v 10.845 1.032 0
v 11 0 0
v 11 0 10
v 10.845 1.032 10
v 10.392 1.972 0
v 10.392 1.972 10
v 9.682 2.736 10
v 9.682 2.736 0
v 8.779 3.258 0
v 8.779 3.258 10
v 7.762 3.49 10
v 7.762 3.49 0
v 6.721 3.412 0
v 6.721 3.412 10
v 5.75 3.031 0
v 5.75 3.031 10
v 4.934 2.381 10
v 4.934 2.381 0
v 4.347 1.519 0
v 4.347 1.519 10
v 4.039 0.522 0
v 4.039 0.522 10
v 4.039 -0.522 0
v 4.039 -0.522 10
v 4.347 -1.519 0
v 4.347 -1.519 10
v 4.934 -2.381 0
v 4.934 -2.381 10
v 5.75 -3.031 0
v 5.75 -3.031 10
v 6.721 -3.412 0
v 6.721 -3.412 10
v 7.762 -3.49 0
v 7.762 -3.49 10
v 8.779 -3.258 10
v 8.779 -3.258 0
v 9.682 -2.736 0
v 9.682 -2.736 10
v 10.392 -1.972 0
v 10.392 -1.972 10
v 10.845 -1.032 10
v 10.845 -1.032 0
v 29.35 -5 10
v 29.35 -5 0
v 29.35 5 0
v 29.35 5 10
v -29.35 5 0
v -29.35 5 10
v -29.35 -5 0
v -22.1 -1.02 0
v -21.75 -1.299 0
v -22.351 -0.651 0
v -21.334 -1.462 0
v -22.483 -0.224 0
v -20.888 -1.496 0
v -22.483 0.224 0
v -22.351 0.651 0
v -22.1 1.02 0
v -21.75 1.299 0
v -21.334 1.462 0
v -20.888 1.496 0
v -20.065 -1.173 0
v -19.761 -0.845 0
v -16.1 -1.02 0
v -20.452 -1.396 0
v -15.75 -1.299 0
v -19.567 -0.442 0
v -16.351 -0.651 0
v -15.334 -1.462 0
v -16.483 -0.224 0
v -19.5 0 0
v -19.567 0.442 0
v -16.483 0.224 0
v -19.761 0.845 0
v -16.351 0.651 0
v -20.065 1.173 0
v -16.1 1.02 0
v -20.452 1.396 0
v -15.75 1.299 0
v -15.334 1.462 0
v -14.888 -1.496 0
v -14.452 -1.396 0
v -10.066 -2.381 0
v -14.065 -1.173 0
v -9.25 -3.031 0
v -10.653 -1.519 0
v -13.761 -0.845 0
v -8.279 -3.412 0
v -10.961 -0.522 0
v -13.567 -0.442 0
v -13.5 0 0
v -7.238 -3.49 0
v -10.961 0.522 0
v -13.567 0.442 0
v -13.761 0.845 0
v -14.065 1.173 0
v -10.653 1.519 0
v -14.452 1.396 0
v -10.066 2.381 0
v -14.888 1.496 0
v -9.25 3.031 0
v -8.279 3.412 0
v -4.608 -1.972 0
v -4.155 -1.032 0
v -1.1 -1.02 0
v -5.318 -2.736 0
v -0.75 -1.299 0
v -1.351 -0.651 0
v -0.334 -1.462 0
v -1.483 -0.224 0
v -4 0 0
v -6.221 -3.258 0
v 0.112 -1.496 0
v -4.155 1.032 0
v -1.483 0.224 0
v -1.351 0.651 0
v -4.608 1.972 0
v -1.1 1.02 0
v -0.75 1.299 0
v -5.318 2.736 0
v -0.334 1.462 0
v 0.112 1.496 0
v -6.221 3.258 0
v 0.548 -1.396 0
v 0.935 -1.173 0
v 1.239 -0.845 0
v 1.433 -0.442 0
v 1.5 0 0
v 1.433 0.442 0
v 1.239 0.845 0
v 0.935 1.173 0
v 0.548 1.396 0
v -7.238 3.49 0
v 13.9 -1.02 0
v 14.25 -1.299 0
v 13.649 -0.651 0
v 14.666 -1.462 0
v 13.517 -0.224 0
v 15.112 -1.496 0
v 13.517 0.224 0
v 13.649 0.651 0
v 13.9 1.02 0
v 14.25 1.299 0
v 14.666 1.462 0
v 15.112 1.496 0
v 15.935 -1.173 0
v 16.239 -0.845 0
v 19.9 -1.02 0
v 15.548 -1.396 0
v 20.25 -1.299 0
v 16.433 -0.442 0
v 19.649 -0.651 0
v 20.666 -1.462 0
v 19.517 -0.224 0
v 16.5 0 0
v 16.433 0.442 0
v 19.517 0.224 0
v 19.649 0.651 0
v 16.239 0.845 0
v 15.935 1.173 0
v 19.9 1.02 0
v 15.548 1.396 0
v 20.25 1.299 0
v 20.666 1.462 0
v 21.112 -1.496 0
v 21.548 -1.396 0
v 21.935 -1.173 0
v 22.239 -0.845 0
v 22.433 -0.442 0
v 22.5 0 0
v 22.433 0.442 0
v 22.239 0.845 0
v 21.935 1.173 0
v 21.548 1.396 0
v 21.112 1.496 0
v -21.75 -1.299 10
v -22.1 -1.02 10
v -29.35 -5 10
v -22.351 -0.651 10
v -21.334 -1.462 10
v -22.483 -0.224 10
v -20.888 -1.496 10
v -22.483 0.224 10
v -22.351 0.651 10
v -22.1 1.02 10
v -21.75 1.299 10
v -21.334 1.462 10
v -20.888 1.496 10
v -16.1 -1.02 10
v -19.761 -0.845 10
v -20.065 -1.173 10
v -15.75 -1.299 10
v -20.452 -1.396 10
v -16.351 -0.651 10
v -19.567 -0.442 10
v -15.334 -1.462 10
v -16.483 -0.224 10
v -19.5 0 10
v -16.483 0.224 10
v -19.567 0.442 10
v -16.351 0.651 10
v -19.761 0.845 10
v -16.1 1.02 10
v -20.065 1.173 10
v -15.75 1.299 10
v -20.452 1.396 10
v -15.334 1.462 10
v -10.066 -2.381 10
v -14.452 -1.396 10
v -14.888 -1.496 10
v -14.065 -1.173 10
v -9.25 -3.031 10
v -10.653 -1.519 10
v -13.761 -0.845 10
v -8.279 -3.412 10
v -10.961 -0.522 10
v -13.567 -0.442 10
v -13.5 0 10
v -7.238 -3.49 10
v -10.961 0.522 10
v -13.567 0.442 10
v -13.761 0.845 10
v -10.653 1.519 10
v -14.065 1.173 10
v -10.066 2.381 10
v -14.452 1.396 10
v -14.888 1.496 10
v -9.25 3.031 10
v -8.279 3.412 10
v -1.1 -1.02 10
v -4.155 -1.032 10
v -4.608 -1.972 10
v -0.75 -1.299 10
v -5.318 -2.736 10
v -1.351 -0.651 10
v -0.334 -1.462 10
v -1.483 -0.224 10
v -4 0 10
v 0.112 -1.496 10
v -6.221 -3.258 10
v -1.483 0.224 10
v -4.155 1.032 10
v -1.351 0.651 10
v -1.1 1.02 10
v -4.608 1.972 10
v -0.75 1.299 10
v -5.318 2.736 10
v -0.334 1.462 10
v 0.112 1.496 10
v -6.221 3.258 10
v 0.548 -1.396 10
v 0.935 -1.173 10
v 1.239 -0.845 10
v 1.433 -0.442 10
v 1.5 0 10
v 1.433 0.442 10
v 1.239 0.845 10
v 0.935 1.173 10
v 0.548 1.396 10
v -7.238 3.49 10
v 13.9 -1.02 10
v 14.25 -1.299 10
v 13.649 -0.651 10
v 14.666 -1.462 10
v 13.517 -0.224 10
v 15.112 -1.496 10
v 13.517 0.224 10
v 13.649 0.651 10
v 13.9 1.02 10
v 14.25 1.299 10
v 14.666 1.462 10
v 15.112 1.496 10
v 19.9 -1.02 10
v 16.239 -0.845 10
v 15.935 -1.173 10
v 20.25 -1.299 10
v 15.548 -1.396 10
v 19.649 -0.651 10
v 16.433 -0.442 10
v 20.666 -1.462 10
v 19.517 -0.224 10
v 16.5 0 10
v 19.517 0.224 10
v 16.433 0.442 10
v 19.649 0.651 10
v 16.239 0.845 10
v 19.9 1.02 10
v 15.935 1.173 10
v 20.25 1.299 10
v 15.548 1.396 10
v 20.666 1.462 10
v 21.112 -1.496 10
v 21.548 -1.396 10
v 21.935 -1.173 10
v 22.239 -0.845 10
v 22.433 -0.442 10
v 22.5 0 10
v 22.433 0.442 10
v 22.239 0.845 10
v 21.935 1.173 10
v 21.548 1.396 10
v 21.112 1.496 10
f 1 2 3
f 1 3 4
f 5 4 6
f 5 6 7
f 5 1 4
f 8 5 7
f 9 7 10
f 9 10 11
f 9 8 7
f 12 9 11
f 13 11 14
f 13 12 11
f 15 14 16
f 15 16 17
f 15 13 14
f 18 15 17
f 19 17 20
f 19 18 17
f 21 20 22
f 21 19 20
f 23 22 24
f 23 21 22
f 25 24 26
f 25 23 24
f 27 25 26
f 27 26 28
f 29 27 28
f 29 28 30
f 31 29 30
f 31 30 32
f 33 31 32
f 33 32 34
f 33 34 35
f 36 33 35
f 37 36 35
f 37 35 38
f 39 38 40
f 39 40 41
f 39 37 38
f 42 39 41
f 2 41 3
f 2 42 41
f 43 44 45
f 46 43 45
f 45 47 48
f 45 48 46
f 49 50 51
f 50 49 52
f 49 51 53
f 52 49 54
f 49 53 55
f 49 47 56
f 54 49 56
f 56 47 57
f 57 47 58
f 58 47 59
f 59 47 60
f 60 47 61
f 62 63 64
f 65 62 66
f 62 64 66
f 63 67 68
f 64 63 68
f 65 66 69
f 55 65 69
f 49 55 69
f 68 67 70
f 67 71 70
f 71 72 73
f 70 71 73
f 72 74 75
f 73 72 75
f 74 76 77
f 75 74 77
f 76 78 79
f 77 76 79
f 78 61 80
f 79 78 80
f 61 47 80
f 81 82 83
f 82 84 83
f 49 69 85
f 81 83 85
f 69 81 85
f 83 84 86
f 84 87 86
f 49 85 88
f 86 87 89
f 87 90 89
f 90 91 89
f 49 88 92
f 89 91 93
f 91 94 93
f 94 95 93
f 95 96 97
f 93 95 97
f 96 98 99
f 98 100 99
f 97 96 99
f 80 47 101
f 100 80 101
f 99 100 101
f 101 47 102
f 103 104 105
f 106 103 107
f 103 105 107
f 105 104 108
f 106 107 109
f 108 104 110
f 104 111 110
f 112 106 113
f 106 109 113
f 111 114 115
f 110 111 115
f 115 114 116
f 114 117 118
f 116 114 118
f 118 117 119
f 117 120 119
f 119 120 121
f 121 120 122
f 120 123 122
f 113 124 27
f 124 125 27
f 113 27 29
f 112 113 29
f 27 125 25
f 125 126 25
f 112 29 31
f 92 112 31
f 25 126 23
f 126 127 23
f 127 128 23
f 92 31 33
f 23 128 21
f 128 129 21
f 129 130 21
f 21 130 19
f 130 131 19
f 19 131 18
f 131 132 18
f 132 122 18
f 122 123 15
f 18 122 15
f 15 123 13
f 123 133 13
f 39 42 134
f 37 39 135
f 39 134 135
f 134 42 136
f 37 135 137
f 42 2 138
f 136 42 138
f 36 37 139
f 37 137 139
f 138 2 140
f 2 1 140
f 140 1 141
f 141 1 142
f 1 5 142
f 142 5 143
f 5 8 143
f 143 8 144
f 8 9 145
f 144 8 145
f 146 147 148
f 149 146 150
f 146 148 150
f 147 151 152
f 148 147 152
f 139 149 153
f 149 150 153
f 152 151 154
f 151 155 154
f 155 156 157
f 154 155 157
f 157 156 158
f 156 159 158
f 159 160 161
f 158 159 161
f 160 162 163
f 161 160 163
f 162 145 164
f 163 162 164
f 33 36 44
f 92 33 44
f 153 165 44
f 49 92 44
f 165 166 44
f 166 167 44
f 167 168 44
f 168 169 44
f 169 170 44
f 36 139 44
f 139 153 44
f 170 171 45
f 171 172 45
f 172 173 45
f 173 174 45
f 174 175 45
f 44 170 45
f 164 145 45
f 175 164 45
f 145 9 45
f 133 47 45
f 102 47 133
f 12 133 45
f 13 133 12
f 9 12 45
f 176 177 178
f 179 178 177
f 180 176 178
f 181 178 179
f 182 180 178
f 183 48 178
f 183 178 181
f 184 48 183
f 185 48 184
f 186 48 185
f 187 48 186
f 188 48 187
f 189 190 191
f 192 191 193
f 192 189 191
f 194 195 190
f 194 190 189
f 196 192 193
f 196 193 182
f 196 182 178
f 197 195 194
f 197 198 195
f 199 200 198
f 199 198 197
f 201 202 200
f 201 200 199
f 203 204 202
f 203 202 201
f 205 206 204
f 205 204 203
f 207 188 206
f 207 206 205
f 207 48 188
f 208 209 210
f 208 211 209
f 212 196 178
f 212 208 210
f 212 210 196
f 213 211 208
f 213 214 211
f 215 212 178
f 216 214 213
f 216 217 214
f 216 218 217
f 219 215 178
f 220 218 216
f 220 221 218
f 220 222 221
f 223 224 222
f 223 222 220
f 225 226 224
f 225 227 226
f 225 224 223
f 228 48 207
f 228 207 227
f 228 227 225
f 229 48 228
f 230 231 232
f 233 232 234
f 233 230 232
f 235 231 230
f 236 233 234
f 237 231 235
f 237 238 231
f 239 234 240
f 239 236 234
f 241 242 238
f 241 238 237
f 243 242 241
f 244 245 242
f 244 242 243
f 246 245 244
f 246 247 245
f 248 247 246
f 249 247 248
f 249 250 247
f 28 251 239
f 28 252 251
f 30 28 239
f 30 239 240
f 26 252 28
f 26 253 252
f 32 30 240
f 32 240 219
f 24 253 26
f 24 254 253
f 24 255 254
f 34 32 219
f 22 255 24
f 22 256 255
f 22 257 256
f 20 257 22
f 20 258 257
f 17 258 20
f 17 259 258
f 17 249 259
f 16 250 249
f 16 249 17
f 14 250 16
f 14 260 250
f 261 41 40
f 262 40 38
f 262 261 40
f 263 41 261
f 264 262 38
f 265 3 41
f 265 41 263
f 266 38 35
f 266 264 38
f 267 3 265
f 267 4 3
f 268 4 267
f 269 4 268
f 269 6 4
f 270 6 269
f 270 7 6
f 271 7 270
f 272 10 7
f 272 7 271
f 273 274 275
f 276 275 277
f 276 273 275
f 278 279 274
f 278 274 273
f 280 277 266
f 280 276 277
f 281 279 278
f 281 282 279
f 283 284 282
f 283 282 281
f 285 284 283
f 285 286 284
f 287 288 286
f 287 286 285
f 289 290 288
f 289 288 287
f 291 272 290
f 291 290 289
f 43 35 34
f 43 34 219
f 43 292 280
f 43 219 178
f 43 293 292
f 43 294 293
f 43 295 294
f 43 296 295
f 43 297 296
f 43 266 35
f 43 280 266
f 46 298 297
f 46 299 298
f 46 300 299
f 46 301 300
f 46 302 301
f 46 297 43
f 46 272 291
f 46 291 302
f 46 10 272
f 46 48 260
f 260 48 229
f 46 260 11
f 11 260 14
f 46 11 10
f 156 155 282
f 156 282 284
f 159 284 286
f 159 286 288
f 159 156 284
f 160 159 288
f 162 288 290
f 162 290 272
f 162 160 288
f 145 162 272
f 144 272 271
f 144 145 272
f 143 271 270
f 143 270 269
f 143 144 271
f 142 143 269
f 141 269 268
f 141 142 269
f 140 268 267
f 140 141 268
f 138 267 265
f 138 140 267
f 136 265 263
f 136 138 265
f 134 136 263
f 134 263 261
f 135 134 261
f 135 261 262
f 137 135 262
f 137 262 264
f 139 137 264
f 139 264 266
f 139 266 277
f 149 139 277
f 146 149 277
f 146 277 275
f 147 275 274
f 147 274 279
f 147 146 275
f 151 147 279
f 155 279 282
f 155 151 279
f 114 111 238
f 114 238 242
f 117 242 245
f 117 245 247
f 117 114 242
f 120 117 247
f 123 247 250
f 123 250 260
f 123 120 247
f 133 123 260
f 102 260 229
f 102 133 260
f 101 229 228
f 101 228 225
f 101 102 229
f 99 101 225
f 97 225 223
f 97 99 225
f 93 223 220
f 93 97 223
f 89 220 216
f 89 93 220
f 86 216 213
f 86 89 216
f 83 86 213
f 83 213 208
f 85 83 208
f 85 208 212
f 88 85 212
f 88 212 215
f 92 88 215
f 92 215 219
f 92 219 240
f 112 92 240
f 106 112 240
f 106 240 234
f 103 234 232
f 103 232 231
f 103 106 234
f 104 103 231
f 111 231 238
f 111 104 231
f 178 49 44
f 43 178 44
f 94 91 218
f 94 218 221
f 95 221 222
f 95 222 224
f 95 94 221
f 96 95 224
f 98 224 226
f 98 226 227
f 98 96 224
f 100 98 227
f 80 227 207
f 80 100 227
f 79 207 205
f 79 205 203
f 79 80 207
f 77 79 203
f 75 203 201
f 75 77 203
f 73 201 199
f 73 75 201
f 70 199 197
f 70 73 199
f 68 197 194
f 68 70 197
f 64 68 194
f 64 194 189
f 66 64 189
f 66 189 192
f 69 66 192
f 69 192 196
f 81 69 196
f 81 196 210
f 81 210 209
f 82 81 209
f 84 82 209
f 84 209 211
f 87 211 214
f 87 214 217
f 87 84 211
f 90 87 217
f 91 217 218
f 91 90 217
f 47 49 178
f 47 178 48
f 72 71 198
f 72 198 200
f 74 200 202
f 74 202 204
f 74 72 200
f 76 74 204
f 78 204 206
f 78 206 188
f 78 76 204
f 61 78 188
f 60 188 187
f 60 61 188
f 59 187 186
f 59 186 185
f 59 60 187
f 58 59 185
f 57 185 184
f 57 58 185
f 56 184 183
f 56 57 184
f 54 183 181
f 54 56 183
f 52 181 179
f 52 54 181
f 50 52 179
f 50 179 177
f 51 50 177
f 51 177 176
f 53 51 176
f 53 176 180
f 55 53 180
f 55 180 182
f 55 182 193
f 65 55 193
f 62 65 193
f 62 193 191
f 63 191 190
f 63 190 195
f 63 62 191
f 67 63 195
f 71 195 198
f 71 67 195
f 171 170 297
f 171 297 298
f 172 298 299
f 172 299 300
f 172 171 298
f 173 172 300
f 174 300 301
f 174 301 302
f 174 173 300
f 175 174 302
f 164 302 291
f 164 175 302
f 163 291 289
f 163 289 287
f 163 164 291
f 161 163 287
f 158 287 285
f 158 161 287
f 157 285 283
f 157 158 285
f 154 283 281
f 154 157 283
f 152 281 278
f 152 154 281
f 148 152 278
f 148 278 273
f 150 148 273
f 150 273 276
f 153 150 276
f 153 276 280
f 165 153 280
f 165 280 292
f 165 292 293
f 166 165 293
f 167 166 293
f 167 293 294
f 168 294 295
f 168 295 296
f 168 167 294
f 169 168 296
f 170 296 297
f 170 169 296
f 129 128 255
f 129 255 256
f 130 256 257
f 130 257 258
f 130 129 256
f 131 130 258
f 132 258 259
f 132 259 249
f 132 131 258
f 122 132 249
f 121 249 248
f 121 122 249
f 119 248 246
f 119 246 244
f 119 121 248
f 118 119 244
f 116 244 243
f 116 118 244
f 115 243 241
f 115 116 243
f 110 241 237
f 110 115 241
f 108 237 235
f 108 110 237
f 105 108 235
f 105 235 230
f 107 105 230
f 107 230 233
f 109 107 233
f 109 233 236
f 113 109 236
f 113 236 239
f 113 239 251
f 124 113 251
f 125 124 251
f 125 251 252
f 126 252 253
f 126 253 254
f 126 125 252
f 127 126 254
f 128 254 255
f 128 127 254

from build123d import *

# Parameters (mm, degrees)
F0_W     = 58.7
F0_H     = 10
F0_R     = 1.5
F0_R_2   = 3.5
F1_DEPTH = 10


with BuildPart() as f1:
    # F0 (on Top) → F1 (new body)
    with BuildSketch(Plane.XY):
        Rectangle(F0_W, F0_H)
        with Locations((-21, 0)):
            Circle(F0_R, mode=Mode.SUBTRACT)
        with Locations((-15, 0)):
            Circle(F0_R, mode=Mode.SUBTRACT)
        with Locations((-7.5, 0)):
            Circle(F0_R_2, mode=Mode.SUBTRACT)
        Circle(F0_R, mode=Mode.SUBTRACT)
        with Locations((7.5, 0)):
            Circle(F0_R_2, mode=Mode.SUBTRACT)
        with Locations((15, 0)):
            Circle(F0_R, mode=Mode.SUBTRACT)
        with Locations((21, 0)):
            Circle(F0_R, mode=Mode.SUBTRACT)
    extrude(amount=F1_DEPTH)


solid = f1.part
